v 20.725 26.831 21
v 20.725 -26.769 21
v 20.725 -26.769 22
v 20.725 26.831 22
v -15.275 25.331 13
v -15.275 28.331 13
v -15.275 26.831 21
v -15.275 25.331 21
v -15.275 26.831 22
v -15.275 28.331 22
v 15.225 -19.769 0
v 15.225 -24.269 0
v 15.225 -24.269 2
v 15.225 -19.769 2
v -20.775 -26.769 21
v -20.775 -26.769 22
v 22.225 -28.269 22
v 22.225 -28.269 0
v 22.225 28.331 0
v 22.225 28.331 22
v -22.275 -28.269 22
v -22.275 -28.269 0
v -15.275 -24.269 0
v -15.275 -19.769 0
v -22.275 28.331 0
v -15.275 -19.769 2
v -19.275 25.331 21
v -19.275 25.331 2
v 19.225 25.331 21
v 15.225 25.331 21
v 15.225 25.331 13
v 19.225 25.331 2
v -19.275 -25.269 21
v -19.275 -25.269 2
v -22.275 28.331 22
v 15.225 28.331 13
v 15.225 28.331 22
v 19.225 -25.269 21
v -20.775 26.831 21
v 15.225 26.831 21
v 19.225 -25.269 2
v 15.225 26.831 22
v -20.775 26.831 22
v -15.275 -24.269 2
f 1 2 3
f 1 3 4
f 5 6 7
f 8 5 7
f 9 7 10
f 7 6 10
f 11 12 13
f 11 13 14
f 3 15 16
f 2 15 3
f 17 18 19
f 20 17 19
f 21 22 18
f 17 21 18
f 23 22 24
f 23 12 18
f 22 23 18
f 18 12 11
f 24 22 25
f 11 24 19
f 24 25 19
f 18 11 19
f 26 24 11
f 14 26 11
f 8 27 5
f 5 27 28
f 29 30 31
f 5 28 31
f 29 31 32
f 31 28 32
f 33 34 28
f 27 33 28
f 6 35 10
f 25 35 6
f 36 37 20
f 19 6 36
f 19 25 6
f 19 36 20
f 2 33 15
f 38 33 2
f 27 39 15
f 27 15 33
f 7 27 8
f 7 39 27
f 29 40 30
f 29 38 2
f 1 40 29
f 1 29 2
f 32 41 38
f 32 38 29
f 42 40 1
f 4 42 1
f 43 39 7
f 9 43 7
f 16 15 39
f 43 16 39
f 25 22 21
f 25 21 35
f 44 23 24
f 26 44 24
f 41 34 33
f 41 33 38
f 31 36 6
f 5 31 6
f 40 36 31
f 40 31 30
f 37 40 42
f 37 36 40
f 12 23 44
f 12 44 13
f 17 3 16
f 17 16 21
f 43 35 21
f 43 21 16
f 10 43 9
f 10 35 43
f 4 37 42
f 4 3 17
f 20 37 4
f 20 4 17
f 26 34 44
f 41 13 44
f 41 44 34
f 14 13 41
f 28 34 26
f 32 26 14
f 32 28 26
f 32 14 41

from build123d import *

# Parameters (mm, degrees)
F0_W     = 38.5
F0_H     = 50.6
F1_DEPTH = 2
F0_W_2   = 41.5
F0_H_2   = 53.6
F2_DEPTH = 21
F0_W_3   = 44.5
F0_H_3   = 56.6
F3_DEPTH = 22
F4_W     = 30.5
F4_H     = 9
F5_DEPTH = 4
F6_W     = 30.5
F6_H     = 4.5
F7_DEPTH = 4


with BuildPart() as f1:
    # F0 (on Top) → F1 (new body)
    with BuildSketch(Plane.XY):
        with Locations((-0.024678, 0.031045)):
            Rectangle(F0_W, F0_H)
    extrude(amount=F1_DEPTH)

    # F0 (on Top) → F2 (join)
    with BuildSketch(Plane.XY):
        with Locations((-0.024678, 0.031045)):
            Rectangle(F0_W_2, F0_H_2)
        with Locations((-0.024678, 0.031045)):
            Rectangle(F0_W, F0_H, mode=Mode.SUBTRACT)
    extrude(amount=F2_DEPTH)

    # F0 (on Top) → F3 (join)
    with BuildSketch(Plane.XY):
        with Locations((-0.024678, 0.031045)):
            Rectangle(F0_W_3, F0_H_3)
        with Locations((-0.024678, 0.031045)):
            Rectangle(F0_W_2, F0_H_2, mode=Mode.SUBTRACT)
    extrude(amount=F3_DEPTH)

    # F4 (on face) → F5 (cut)
    with BuildSketch(Plane(origin=(0, 28.331045, 0), x_dir=(-1, 0, 0), z_dir=(0, 1, 0))):
        with Locations((0.024678, 17.5)):
            Rectangle(F4_W, F4_H)
    extrude(amount=-F5_DEPTH, mode=Mode.SUBTRACT)

    # F6 (on face) → F7 (cut)
    with BuildSketch(Plane.XY):
        with Locations((-0.024678, -22.018955)):
            Rectangle(F6_W, F6_H)
    extrude(amount=F7_DEPTH, mode=Mode.SUBTRACT)


solid = f1.part
